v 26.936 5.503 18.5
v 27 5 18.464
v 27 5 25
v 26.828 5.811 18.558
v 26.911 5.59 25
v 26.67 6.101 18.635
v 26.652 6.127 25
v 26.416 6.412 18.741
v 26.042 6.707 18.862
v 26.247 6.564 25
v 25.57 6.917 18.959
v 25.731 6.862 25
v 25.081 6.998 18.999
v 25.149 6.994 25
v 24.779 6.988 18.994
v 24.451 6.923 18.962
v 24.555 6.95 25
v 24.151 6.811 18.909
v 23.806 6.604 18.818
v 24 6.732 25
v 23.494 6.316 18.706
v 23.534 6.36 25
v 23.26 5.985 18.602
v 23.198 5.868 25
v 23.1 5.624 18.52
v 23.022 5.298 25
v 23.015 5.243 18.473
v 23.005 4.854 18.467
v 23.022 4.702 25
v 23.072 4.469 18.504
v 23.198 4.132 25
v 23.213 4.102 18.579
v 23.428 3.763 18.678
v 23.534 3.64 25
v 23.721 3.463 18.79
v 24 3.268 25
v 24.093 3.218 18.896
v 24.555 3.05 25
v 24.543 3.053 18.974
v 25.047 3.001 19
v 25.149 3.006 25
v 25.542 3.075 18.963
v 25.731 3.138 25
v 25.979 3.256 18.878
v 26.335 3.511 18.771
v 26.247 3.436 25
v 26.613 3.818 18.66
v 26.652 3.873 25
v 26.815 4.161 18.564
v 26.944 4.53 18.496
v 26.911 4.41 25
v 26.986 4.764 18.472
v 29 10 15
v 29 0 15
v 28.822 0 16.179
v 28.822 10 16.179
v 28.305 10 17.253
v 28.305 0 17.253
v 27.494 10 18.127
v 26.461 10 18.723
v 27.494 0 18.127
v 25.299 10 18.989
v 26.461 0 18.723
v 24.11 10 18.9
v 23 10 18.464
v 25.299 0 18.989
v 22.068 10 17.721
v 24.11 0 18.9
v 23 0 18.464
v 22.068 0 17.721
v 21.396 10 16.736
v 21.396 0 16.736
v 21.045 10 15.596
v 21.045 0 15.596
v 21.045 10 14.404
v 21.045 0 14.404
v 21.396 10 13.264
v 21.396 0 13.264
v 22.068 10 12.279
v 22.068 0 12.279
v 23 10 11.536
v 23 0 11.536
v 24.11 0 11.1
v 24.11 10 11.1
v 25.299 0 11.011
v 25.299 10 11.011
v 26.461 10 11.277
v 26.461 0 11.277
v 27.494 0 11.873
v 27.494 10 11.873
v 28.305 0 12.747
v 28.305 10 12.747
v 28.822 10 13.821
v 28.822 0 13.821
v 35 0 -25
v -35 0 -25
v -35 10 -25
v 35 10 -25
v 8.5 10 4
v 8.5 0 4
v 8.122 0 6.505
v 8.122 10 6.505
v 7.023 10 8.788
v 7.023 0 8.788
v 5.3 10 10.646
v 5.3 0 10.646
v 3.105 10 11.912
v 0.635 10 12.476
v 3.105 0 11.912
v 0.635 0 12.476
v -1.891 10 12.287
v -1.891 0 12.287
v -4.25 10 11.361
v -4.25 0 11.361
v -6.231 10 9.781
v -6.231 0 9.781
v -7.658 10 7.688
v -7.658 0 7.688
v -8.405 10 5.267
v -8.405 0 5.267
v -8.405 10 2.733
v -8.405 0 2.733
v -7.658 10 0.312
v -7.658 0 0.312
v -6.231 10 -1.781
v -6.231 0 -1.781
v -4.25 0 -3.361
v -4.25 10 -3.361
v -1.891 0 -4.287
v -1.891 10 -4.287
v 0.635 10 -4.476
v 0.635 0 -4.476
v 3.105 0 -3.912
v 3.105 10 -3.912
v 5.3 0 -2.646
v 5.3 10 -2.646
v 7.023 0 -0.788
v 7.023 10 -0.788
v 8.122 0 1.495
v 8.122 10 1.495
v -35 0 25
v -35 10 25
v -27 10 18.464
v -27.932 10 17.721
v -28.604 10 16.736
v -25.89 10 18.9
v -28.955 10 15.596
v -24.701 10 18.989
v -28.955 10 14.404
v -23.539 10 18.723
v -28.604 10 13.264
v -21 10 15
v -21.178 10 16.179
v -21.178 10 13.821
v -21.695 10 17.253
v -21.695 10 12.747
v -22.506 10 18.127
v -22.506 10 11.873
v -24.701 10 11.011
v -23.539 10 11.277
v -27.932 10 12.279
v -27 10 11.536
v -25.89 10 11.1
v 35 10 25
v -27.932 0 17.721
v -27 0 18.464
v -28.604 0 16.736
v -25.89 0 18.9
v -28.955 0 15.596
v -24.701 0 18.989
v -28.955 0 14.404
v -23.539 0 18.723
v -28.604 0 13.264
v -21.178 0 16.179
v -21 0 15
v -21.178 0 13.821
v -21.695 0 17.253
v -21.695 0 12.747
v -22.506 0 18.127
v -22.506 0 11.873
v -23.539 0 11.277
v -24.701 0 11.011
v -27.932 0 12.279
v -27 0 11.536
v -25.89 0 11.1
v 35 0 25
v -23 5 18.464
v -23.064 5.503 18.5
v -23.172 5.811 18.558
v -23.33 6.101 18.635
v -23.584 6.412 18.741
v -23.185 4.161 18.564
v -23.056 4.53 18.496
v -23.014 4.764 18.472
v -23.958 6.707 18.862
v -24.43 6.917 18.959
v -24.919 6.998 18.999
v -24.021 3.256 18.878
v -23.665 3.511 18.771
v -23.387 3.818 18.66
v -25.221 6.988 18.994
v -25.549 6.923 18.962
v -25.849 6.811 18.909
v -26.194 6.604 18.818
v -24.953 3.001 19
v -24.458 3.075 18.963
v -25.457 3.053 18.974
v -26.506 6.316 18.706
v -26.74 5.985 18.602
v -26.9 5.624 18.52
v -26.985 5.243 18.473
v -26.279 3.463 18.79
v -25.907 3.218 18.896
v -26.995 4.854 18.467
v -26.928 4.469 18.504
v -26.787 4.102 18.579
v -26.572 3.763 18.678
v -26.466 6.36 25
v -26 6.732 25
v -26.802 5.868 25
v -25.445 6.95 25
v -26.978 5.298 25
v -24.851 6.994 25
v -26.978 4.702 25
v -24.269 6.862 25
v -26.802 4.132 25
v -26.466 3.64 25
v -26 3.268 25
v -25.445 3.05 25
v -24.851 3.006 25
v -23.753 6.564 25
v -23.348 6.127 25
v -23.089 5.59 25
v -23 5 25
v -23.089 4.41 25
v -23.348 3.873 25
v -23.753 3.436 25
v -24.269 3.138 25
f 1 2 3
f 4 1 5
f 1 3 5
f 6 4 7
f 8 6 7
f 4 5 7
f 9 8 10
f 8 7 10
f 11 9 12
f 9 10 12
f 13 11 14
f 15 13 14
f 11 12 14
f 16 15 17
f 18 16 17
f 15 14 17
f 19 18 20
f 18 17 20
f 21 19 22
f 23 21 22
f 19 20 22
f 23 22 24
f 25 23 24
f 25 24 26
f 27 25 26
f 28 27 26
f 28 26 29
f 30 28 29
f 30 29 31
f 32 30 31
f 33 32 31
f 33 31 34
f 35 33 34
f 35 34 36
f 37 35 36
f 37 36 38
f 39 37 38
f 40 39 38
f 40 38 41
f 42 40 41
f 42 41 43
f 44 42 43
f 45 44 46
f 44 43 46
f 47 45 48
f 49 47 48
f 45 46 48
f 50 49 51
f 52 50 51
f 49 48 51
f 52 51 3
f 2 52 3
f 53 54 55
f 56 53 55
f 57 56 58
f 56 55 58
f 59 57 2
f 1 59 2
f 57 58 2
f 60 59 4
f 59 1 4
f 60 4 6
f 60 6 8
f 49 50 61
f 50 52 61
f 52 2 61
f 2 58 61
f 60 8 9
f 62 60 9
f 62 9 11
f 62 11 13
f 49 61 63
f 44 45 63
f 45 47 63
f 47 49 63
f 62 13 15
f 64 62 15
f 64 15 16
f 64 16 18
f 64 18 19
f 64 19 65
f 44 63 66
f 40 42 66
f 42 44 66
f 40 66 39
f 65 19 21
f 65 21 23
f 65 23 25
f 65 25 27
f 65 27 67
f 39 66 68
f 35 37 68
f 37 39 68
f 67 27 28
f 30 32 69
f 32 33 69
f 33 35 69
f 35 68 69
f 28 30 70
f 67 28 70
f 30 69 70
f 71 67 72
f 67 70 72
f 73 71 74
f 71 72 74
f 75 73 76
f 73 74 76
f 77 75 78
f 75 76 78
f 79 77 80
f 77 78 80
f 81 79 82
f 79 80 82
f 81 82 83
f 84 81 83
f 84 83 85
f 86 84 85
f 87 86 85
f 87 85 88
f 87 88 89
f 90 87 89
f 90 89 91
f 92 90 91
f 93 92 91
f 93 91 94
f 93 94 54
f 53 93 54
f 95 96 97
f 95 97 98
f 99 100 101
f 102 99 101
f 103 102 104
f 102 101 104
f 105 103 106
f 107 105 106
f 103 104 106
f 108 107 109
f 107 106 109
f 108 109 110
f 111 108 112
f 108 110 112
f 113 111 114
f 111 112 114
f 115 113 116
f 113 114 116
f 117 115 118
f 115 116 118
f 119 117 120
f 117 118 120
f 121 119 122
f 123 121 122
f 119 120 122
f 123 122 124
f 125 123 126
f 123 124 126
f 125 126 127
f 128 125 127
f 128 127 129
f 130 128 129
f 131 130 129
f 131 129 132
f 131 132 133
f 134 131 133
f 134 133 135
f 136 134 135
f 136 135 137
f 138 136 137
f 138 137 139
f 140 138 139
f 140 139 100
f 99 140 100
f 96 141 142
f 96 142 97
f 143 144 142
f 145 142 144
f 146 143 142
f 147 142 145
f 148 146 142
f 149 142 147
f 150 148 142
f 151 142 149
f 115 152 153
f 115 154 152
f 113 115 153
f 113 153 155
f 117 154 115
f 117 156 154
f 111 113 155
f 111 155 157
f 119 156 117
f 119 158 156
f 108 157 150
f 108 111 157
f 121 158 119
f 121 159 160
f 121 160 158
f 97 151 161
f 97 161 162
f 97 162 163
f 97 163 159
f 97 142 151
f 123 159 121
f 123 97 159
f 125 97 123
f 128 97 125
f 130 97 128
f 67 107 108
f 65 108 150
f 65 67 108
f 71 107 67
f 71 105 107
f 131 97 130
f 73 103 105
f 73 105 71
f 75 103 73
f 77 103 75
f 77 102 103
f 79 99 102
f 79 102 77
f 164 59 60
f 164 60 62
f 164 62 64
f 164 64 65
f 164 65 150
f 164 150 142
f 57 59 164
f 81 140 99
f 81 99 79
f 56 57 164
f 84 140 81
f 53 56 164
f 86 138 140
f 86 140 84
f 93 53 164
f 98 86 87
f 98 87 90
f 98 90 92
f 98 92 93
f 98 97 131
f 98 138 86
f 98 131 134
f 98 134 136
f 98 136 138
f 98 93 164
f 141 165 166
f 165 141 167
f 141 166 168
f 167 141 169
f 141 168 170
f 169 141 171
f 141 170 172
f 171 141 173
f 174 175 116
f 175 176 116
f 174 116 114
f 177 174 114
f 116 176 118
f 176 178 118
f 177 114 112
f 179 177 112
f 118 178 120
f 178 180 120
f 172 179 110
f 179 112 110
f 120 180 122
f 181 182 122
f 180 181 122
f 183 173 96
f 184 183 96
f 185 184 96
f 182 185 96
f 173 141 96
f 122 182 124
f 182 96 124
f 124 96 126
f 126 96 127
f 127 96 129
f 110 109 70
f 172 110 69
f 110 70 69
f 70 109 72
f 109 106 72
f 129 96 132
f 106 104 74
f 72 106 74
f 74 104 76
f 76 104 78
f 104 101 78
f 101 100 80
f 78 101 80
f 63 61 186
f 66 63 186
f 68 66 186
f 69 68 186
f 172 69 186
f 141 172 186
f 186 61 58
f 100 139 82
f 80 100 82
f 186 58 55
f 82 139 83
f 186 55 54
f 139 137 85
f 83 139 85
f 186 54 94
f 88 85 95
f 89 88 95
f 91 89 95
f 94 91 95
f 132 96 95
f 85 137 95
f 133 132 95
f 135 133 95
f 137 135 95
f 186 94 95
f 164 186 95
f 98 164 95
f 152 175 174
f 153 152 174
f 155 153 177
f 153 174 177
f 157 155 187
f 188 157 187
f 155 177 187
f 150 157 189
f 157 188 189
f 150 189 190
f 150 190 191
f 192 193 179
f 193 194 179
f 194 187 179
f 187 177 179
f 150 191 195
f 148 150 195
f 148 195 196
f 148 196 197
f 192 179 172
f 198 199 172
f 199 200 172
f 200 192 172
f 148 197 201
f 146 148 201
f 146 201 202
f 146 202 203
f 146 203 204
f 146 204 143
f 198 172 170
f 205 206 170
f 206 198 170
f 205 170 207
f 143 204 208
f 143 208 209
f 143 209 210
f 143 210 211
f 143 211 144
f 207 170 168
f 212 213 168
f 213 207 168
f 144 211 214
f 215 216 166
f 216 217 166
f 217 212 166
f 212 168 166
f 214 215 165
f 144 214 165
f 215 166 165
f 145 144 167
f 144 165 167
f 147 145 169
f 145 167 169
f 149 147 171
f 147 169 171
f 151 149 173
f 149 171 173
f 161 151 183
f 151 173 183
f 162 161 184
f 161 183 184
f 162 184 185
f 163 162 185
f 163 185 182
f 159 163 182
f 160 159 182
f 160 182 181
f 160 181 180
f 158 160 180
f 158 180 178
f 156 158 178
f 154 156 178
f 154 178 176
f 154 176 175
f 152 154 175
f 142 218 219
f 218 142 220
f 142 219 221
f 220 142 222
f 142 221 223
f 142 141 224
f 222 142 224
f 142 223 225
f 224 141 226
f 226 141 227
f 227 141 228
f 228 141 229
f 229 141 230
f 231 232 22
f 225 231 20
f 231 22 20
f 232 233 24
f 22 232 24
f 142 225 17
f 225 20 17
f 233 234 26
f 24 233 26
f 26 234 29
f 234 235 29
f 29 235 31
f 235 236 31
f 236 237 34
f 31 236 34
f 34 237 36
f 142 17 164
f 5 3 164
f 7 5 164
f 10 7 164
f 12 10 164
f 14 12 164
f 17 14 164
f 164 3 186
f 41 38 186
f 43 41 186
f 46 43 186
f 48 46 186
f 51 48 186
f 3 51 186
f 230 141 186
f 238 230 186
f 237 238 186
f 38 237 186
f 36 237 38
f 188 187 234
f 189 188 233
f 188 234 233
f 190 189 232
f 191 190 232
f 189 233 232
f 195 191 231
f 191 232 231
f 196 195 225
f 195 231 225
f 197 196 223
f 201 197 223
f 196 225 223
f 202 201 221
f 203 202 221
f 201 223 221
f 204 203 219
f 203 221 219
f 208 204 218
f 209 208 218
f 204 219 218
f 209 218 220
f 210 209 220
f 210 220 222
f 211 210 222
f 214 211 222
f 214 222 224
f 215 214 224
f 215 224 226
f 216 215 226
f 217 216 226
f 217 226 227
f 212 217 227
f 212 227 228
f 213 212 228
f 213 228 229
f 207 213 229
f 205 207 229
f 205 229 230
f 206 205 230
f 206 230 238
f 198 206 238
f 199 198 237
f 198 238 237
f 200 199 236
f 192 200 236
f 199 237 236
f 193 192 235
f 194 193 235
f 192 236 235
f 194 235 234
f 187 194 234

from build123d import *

# Parameters (mm, degrees)
SKETCH2_W           = 70
SKETCH2_H           = 50
BOSS_EXTRUDE1_DEPTH = 10
SKETCH3_R           = 4
CUT_EXTRUDE1_DEPTH  = 11
SKETCH4_R           = 2
CUT_EXTRUDE2_DEPTH  = 10
SKETCH5_R           = 8.5
CUT_EXTRUDE3_DEPTH  = 11.0000001


with BuildPart() as part:
    # Sketch2 → Boss-Extrude1 (new body)
    with BuildSketch(Plane(origin=(0, 0, 0), x_dir=(1, 0, 0), z_dir=(0, 1, 0))):
        Rectangle(SKETCH2_W, SKETCH2_H)
    extrude(amount=BOSS_EXTRUDE1_DEPTH)

    # Sketch3 → Cut-Extrude1 (cut, through all)
    with BuildSketch(Plane.XZ):
        with Locations((-25, 15)):
            Circle(SKETCH3_R)
        with Locations((25, 15)):
            Circle(SKETCH3_R)
    extrude(amount=-CUT_EXTRUDE1_DEPTH, mode=Mode.SUBTRACT)

    # Sketch4 → Cut-Extrude2 (cut)
    with BuildSketch(Plane.XY.offset(25)):
        with Locations((25, 5)):
            Circle(SKETCH4_R)
        with Locations((-25, 5)):
            Circle(SKETCH4_R)
    extrude(amount=-CUT_EXTRUDE2_DEPTH, mode=Mode.SUBTRACT)

    # Sketch5 → Cut-Extrude3 (cut, through all)
    with BuildSketch(Plane.XZ):
        with Locations((0, 4)):
            Circle(SKETCH5_R)
    extrude(amount=-CUT_EXTRUDE3_DEPTH, mode=Mode.SUBTRACT)


solid = part.part
